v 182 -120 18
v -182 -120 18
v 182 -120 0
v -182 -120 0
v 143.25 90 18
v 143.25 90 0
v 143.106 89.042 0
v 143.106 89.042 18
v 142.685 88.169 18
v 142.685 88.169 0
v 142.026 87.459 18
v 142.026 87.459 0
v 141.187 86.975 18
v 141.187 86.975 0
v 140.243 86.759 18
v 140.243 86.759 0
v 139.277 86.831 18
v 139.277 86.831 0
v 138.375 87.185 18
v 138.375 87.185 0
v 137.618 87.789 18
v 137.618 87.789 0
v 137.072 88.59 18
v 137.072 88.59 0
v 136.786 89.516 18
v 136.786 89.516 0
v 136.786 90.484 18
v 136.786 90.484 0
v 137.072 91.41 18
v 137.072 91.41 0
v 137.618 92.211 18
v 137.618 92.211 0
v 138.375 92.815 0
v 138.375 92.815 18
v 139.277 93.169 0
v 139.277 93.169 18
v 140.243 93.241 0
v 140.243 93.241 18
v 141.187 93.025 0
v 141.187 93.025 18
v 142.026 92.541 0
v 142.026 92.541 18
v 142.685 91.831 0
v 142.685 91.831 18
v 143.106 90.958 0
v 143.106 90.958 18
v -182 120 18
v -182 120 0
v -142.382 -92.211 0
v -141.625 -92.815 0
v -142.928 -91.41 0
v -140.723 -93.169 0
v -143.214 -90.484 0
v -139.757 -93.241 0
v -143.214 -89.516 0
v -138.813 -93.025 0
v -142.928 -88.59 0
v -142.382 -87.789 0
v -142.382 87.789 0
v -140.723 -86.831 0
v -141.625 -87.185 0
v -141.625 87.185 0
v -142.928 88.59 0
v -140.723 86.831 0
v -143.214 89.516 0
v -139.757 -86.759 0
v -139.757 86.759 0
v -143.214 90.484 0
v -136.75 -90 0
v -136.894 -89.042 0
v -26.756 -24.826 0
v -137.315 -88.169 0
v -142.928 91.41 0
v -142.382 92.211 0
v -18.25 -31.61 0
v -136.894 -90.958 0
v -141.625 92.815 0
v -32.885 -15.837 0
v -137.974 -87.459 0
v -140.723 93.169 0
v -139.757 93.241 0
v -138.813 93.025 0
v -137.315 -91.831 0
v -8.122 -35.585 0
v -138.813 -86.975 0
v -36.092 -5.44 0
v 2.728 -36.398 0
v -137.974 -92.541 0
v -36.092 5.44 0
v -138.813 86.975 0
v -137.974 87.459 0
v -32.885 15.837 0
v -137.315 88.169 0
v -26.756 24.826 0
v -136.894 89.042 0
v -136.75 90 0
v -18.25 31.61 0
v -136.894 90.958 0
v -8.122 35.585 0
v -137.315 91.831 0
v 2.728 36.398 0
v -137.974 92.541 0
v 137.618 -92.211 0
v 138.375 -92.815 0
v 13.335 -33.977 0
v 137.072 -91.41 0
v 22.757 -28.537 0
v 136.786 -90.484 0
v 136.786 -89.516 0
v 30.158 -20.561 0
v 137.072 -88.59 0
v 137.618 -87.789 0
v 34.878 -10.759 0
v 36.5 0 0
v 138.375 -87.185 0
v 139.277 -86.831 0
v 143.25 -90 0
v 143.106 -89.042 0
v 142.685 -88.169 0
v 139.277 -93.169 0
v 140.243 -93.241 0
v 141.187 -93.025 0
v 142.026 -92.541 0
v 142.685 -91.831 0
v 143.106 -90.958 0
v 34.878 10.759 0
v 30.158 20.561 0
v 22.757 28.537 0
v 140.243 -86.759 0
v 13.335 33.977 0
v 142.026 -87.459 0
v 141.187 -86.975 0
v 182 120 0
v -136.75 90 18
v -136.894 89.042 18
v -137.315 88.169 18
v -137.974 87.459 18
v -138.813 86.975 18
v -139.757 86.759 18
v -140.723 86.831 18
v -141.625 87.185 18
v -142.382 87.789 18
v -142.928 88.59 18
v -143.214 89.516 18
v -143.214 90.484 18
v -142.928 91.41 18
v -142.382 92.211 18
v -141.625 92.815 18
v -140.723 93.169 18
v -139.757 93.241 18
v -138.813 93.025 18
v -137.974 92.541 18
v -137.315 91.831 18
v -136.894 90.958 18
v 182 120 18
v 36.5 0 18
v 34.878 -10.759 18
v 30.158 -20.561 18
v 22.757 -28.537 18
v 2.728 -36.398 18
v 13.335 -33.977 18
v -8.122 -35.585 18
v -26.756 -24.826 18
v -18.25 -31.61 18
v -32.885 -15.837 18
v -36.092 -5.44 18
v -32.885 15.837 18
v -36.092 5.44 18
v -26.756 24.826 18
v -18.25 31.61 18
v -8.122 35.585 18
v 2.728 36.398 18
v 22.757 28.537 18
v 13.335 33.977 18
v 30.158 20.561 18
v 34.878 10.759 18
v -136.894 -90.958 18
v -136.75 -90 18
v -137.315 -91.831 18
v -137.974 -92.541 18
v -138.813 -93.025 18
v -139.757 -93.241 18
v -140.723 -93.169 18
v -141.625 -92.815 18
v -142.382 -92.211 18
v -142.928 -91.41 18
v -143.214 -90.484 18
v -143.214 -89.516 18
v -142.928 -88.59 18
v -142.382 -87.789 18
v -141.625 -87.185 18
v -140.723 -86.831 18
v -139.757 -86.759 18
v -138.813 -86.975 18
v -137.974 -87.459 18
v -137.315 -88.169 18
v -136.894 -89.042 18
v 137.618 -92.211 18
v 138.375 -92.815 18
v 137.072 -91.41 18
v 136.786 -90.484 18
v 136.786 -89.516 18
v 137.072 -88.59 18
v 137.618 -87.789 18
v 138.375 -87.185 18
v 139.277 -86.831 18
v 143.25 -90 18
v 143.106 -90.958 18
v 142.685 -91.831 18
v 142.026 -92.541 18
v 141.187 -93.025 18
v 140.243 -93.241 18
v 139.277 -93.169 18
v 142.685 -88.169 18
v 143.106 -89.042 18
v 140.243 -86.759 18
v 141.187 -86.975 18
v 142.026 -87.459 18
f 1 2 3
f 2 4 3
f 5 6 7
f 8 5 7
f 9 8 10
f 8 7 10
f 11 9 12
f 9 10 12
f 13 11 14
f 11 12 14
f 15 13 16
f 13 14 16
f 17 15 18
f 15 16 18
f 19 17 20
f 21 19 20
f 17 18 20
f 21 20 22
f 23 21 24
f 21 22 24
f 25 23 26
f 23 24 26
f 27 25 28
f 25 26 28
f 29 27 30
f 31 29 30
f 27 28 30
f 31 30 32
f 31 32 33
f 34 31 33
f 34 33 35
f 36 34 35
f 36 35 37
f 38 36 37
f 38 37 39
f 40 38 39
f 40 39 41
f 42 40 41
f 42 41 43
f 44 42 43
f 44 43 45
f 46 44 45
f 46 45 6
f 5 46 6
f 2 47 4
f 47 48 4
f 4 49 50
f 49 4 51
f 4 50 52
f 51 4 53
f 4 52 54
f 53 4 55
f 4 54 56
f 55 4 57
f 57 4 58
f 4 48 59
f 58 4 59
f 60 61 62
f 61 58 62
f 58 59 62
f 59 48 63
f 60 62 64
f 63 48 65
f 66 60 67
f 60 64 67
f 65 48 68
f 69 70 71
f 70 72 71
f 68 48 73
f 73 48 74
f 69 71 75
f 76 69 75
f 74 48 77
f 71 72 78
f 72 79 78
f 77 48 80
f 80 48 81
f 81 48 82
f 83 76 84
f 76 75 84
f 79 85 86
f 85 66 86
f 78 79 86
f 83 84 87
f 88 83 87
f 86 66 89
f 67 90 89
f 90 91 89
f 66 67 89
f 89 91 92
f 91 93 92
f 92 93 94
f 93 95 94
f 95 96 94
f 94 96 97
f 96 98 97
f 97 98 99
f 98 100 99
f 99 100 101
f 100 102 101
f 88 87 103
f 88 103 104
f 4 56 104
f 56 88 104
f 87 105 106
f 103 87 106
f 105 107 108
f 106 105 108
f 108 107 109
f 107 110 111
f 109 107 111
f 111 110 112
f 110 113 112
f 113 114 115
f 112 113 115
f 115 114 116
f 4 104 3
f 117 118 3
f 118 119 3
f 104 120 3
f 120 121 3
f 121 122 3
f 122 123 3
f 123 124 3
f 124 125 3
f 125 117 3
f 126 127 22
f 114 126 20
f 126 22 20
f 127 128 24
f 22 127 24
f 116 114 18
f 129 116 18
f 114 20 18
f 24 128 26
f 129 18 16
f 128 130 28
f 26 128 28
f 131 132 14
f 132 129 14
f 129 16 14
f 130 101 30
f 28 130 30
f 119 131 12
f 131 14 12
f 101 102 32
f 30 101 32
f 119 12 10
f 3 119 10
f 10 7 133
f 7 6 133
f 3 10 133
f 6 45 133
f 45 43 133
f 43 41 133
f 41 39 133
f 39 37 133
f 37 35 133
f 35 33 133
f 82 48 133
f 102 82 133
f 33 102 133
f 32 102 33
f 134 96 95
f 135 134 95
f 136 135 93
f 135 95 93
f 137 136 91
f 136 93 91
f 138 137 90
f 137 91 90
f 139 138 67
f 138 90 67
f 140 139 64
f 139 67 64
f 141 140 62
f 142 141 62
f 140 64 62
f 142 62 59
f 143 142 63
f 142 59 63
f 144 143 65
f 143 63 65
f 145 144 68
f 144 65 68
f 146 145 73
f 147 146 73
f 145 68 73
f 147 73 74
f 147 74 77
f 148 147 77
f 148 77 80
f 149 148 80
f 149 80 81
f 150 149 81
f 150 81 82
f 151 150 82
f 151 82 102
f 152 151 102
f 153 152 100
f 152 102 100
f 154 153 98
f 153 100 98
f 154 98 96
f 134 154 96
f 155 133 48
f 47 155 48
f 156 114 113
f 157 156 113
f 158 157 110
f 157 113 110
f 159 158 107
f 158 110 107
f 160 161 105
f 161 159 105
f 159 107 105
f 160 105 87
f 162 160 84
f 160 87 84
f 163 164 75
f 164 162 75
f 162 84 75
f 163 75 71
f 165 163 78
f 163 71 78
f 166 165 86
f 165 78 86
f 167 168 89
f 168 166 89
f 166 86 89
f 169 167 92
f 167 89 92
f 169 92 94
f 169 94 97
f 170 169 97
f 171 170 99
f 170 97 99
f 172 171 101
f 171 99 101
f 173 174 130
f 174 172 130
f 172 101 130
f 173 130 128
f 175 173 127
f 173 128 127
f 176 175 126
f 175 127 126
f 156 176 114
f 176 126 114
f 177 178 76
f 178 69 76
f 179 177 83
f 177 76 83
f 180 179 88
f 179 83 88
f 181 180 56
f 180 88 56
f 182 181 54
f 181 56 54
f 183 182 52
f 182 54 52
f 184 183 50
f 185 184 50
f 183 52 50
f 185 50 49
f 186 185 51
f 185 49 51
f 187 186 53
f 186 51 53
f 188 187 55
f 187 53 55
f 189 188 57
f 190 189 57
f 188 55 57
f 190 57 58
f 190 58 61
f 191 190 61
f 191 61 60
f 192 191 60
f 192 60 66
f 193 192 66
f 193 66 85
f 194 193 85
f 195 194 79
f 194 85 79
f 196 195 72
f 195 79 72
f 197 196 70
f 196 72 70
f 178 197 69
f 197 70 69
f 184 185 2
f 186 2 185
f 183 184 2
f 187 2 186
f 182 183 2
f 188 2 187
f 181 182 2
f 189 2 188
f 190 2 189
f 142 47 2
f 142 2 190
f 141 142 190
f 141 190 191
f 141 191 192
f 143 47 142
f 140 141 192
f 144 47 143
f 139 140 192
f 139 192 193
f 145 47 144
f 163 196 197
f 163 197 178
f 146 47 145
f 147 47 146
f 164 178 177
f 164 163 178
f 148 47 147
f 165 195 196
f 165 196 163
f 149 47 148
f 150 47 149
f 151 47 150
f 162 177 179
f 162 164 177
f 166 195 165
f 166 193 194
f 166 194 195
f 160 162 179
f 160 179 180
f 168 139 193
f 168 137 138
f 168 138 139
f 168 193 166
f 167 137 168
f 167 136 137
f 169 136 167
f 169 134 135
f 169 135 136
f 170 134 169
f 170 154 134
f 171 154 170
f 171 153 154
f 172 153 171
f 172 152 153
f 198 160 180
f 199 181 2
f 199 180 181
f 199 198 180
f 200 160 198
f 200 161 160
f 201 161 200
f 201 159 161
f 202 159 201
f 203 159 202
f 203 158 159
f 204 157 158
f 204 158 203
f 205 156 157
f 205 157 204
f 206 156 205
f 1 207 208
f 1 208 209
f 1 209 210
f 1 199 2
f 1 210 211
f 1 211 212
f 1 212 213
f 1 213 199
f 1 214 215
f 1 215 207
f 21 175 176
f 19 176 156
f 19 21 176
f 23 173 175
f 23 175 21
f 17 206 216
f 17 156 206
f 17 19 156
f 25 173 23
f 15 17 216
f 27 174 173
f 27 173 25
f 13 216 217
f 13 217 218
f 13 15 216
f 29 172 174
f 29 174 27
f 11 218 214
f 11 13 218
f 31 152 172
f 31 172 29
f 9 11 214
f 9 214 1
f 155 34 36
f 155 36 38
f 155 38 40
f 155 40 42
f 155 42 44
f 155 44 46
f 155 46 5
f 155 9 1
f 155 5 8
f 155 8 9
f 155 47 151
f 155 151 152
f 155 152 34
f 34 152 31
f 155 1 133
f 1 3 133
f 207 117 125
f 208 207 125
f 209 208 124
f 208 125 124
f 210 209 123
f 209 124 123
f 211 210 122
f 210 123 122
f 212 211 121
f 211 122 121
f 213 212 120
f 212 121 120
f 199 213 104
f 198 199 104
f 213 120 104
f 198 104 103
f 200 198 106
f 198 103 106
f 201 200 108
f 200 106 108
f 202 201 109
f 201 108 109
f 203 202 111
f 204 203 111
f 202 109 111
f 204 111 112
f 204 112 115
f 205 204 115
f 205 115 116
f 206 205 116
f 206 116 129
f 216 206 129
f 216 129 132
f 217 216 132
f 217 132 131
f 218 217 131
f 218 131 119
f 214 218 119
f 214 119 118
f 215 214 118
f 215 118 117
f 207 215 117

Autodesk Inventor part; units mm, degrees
ref_plane "YZ Plane" through (0, 0, 0) normal (1, 0, 0) x (0, 1, 0)
ref_plane "XZ Plane" through (0, 0, 0) normal (0, 1, 0) x (-1, 0, 0)
ref_plane "XY Plane" through (0, 0, 0) normal (0, 0, 1) x (1, 0, 0)
sketch "Skizze1" plane through (0, 0, 0) normal (0, 0, 1) x (1, 0, 0)
  line L0 (-182, -120) -> (182, -120)
  line L1 (182, -120) -> (182, 120)
  line L2 (182, 120) -> (-182, 120)
  line L3 (-182, 120) -> (-182, -120)
  line L4 (-182, -120) -> (182, 120) construction
  line L5 (182, -120) -> (-182, 120) construction
  circle A0 centre (0, 0) radius 36.5
  line L6 (-140, -90) -> (140, -90)
  line L7 (140, -90) -> (140, 90)
  line L8 (140, 90) -> (-140, 90)
  line L9 (-140, 90) -> (-140, -90)
  line L10 (-140, -90) -> (140, 90) construction
  line L11 (140, -90) -> (-140, 90) construction
  circle A1 centre (-140, 90) radius 3.25
  circle A2 centre (140, 90) radius 3.25
  circle A3 centre (140, -90) radius 3.25
  circle A4 centre (-140, -90) radius 3.25
  point P0 (0, 0)
  point P1 (0, 0)
  point P2 (0, 0)
  dimension "d0" = 364
  dimension "d1" = 240
  dimension "d5" = 73
  dimension "d6" = 280
  dimension "d7" = 180
  dimension "d8" = 6.5
extrude "Extrusion1" add sketch "Skizze1" along normal blind 18 contours L3 L2 L1 L0 | L9 A4 L6 | L6 A4 L9 | A4 L9 A1 L8 A2 L7 A3 L6 | A3 L7 L6 | L6 L7 A3 | A1 L8 L9 | L9 L8 A1 | A2 L8 L7 | L7 L8 A2
extrude "Extrusion2" cut sketch "Skizze1" along normal through all contours L9 A4 L6 | L6 A4 L9 | A3 L7 L6 | L6 L7 A3 | A1 L8 L9 | L9 L8 A1 | A2 L8 L7 | L7 L8 A2
equation "\"d0\" = case_width - 2 * case_thickness"
equation "\"d1\" = inner_depth - inner_thickness"
equation "\"d2\" = case_thickness"
equation "\"kg_thickness\" = 4.9"
equation "\"ht_thickness\" = 1.9"
equation "\"case_thickness\" = 18"
equation "\"inner_thickness\" = 15"
equation "\"gap_fit\" = 0.1"
equation "\"gap_slide\" = 0.2"
equation "\"gap_air\" = 1"
equation "\"bore_diameter\" = 73"
equation "\"mdf_thickness\" = 6"
equation "\"tape_width\" = 15"
equation "\"tape_thickness\" = 3"
equation "\"inner_depth\" = 255"
equation "\"case_width\" = 400"
properties part number "Korpus_Einbau_Basis"
